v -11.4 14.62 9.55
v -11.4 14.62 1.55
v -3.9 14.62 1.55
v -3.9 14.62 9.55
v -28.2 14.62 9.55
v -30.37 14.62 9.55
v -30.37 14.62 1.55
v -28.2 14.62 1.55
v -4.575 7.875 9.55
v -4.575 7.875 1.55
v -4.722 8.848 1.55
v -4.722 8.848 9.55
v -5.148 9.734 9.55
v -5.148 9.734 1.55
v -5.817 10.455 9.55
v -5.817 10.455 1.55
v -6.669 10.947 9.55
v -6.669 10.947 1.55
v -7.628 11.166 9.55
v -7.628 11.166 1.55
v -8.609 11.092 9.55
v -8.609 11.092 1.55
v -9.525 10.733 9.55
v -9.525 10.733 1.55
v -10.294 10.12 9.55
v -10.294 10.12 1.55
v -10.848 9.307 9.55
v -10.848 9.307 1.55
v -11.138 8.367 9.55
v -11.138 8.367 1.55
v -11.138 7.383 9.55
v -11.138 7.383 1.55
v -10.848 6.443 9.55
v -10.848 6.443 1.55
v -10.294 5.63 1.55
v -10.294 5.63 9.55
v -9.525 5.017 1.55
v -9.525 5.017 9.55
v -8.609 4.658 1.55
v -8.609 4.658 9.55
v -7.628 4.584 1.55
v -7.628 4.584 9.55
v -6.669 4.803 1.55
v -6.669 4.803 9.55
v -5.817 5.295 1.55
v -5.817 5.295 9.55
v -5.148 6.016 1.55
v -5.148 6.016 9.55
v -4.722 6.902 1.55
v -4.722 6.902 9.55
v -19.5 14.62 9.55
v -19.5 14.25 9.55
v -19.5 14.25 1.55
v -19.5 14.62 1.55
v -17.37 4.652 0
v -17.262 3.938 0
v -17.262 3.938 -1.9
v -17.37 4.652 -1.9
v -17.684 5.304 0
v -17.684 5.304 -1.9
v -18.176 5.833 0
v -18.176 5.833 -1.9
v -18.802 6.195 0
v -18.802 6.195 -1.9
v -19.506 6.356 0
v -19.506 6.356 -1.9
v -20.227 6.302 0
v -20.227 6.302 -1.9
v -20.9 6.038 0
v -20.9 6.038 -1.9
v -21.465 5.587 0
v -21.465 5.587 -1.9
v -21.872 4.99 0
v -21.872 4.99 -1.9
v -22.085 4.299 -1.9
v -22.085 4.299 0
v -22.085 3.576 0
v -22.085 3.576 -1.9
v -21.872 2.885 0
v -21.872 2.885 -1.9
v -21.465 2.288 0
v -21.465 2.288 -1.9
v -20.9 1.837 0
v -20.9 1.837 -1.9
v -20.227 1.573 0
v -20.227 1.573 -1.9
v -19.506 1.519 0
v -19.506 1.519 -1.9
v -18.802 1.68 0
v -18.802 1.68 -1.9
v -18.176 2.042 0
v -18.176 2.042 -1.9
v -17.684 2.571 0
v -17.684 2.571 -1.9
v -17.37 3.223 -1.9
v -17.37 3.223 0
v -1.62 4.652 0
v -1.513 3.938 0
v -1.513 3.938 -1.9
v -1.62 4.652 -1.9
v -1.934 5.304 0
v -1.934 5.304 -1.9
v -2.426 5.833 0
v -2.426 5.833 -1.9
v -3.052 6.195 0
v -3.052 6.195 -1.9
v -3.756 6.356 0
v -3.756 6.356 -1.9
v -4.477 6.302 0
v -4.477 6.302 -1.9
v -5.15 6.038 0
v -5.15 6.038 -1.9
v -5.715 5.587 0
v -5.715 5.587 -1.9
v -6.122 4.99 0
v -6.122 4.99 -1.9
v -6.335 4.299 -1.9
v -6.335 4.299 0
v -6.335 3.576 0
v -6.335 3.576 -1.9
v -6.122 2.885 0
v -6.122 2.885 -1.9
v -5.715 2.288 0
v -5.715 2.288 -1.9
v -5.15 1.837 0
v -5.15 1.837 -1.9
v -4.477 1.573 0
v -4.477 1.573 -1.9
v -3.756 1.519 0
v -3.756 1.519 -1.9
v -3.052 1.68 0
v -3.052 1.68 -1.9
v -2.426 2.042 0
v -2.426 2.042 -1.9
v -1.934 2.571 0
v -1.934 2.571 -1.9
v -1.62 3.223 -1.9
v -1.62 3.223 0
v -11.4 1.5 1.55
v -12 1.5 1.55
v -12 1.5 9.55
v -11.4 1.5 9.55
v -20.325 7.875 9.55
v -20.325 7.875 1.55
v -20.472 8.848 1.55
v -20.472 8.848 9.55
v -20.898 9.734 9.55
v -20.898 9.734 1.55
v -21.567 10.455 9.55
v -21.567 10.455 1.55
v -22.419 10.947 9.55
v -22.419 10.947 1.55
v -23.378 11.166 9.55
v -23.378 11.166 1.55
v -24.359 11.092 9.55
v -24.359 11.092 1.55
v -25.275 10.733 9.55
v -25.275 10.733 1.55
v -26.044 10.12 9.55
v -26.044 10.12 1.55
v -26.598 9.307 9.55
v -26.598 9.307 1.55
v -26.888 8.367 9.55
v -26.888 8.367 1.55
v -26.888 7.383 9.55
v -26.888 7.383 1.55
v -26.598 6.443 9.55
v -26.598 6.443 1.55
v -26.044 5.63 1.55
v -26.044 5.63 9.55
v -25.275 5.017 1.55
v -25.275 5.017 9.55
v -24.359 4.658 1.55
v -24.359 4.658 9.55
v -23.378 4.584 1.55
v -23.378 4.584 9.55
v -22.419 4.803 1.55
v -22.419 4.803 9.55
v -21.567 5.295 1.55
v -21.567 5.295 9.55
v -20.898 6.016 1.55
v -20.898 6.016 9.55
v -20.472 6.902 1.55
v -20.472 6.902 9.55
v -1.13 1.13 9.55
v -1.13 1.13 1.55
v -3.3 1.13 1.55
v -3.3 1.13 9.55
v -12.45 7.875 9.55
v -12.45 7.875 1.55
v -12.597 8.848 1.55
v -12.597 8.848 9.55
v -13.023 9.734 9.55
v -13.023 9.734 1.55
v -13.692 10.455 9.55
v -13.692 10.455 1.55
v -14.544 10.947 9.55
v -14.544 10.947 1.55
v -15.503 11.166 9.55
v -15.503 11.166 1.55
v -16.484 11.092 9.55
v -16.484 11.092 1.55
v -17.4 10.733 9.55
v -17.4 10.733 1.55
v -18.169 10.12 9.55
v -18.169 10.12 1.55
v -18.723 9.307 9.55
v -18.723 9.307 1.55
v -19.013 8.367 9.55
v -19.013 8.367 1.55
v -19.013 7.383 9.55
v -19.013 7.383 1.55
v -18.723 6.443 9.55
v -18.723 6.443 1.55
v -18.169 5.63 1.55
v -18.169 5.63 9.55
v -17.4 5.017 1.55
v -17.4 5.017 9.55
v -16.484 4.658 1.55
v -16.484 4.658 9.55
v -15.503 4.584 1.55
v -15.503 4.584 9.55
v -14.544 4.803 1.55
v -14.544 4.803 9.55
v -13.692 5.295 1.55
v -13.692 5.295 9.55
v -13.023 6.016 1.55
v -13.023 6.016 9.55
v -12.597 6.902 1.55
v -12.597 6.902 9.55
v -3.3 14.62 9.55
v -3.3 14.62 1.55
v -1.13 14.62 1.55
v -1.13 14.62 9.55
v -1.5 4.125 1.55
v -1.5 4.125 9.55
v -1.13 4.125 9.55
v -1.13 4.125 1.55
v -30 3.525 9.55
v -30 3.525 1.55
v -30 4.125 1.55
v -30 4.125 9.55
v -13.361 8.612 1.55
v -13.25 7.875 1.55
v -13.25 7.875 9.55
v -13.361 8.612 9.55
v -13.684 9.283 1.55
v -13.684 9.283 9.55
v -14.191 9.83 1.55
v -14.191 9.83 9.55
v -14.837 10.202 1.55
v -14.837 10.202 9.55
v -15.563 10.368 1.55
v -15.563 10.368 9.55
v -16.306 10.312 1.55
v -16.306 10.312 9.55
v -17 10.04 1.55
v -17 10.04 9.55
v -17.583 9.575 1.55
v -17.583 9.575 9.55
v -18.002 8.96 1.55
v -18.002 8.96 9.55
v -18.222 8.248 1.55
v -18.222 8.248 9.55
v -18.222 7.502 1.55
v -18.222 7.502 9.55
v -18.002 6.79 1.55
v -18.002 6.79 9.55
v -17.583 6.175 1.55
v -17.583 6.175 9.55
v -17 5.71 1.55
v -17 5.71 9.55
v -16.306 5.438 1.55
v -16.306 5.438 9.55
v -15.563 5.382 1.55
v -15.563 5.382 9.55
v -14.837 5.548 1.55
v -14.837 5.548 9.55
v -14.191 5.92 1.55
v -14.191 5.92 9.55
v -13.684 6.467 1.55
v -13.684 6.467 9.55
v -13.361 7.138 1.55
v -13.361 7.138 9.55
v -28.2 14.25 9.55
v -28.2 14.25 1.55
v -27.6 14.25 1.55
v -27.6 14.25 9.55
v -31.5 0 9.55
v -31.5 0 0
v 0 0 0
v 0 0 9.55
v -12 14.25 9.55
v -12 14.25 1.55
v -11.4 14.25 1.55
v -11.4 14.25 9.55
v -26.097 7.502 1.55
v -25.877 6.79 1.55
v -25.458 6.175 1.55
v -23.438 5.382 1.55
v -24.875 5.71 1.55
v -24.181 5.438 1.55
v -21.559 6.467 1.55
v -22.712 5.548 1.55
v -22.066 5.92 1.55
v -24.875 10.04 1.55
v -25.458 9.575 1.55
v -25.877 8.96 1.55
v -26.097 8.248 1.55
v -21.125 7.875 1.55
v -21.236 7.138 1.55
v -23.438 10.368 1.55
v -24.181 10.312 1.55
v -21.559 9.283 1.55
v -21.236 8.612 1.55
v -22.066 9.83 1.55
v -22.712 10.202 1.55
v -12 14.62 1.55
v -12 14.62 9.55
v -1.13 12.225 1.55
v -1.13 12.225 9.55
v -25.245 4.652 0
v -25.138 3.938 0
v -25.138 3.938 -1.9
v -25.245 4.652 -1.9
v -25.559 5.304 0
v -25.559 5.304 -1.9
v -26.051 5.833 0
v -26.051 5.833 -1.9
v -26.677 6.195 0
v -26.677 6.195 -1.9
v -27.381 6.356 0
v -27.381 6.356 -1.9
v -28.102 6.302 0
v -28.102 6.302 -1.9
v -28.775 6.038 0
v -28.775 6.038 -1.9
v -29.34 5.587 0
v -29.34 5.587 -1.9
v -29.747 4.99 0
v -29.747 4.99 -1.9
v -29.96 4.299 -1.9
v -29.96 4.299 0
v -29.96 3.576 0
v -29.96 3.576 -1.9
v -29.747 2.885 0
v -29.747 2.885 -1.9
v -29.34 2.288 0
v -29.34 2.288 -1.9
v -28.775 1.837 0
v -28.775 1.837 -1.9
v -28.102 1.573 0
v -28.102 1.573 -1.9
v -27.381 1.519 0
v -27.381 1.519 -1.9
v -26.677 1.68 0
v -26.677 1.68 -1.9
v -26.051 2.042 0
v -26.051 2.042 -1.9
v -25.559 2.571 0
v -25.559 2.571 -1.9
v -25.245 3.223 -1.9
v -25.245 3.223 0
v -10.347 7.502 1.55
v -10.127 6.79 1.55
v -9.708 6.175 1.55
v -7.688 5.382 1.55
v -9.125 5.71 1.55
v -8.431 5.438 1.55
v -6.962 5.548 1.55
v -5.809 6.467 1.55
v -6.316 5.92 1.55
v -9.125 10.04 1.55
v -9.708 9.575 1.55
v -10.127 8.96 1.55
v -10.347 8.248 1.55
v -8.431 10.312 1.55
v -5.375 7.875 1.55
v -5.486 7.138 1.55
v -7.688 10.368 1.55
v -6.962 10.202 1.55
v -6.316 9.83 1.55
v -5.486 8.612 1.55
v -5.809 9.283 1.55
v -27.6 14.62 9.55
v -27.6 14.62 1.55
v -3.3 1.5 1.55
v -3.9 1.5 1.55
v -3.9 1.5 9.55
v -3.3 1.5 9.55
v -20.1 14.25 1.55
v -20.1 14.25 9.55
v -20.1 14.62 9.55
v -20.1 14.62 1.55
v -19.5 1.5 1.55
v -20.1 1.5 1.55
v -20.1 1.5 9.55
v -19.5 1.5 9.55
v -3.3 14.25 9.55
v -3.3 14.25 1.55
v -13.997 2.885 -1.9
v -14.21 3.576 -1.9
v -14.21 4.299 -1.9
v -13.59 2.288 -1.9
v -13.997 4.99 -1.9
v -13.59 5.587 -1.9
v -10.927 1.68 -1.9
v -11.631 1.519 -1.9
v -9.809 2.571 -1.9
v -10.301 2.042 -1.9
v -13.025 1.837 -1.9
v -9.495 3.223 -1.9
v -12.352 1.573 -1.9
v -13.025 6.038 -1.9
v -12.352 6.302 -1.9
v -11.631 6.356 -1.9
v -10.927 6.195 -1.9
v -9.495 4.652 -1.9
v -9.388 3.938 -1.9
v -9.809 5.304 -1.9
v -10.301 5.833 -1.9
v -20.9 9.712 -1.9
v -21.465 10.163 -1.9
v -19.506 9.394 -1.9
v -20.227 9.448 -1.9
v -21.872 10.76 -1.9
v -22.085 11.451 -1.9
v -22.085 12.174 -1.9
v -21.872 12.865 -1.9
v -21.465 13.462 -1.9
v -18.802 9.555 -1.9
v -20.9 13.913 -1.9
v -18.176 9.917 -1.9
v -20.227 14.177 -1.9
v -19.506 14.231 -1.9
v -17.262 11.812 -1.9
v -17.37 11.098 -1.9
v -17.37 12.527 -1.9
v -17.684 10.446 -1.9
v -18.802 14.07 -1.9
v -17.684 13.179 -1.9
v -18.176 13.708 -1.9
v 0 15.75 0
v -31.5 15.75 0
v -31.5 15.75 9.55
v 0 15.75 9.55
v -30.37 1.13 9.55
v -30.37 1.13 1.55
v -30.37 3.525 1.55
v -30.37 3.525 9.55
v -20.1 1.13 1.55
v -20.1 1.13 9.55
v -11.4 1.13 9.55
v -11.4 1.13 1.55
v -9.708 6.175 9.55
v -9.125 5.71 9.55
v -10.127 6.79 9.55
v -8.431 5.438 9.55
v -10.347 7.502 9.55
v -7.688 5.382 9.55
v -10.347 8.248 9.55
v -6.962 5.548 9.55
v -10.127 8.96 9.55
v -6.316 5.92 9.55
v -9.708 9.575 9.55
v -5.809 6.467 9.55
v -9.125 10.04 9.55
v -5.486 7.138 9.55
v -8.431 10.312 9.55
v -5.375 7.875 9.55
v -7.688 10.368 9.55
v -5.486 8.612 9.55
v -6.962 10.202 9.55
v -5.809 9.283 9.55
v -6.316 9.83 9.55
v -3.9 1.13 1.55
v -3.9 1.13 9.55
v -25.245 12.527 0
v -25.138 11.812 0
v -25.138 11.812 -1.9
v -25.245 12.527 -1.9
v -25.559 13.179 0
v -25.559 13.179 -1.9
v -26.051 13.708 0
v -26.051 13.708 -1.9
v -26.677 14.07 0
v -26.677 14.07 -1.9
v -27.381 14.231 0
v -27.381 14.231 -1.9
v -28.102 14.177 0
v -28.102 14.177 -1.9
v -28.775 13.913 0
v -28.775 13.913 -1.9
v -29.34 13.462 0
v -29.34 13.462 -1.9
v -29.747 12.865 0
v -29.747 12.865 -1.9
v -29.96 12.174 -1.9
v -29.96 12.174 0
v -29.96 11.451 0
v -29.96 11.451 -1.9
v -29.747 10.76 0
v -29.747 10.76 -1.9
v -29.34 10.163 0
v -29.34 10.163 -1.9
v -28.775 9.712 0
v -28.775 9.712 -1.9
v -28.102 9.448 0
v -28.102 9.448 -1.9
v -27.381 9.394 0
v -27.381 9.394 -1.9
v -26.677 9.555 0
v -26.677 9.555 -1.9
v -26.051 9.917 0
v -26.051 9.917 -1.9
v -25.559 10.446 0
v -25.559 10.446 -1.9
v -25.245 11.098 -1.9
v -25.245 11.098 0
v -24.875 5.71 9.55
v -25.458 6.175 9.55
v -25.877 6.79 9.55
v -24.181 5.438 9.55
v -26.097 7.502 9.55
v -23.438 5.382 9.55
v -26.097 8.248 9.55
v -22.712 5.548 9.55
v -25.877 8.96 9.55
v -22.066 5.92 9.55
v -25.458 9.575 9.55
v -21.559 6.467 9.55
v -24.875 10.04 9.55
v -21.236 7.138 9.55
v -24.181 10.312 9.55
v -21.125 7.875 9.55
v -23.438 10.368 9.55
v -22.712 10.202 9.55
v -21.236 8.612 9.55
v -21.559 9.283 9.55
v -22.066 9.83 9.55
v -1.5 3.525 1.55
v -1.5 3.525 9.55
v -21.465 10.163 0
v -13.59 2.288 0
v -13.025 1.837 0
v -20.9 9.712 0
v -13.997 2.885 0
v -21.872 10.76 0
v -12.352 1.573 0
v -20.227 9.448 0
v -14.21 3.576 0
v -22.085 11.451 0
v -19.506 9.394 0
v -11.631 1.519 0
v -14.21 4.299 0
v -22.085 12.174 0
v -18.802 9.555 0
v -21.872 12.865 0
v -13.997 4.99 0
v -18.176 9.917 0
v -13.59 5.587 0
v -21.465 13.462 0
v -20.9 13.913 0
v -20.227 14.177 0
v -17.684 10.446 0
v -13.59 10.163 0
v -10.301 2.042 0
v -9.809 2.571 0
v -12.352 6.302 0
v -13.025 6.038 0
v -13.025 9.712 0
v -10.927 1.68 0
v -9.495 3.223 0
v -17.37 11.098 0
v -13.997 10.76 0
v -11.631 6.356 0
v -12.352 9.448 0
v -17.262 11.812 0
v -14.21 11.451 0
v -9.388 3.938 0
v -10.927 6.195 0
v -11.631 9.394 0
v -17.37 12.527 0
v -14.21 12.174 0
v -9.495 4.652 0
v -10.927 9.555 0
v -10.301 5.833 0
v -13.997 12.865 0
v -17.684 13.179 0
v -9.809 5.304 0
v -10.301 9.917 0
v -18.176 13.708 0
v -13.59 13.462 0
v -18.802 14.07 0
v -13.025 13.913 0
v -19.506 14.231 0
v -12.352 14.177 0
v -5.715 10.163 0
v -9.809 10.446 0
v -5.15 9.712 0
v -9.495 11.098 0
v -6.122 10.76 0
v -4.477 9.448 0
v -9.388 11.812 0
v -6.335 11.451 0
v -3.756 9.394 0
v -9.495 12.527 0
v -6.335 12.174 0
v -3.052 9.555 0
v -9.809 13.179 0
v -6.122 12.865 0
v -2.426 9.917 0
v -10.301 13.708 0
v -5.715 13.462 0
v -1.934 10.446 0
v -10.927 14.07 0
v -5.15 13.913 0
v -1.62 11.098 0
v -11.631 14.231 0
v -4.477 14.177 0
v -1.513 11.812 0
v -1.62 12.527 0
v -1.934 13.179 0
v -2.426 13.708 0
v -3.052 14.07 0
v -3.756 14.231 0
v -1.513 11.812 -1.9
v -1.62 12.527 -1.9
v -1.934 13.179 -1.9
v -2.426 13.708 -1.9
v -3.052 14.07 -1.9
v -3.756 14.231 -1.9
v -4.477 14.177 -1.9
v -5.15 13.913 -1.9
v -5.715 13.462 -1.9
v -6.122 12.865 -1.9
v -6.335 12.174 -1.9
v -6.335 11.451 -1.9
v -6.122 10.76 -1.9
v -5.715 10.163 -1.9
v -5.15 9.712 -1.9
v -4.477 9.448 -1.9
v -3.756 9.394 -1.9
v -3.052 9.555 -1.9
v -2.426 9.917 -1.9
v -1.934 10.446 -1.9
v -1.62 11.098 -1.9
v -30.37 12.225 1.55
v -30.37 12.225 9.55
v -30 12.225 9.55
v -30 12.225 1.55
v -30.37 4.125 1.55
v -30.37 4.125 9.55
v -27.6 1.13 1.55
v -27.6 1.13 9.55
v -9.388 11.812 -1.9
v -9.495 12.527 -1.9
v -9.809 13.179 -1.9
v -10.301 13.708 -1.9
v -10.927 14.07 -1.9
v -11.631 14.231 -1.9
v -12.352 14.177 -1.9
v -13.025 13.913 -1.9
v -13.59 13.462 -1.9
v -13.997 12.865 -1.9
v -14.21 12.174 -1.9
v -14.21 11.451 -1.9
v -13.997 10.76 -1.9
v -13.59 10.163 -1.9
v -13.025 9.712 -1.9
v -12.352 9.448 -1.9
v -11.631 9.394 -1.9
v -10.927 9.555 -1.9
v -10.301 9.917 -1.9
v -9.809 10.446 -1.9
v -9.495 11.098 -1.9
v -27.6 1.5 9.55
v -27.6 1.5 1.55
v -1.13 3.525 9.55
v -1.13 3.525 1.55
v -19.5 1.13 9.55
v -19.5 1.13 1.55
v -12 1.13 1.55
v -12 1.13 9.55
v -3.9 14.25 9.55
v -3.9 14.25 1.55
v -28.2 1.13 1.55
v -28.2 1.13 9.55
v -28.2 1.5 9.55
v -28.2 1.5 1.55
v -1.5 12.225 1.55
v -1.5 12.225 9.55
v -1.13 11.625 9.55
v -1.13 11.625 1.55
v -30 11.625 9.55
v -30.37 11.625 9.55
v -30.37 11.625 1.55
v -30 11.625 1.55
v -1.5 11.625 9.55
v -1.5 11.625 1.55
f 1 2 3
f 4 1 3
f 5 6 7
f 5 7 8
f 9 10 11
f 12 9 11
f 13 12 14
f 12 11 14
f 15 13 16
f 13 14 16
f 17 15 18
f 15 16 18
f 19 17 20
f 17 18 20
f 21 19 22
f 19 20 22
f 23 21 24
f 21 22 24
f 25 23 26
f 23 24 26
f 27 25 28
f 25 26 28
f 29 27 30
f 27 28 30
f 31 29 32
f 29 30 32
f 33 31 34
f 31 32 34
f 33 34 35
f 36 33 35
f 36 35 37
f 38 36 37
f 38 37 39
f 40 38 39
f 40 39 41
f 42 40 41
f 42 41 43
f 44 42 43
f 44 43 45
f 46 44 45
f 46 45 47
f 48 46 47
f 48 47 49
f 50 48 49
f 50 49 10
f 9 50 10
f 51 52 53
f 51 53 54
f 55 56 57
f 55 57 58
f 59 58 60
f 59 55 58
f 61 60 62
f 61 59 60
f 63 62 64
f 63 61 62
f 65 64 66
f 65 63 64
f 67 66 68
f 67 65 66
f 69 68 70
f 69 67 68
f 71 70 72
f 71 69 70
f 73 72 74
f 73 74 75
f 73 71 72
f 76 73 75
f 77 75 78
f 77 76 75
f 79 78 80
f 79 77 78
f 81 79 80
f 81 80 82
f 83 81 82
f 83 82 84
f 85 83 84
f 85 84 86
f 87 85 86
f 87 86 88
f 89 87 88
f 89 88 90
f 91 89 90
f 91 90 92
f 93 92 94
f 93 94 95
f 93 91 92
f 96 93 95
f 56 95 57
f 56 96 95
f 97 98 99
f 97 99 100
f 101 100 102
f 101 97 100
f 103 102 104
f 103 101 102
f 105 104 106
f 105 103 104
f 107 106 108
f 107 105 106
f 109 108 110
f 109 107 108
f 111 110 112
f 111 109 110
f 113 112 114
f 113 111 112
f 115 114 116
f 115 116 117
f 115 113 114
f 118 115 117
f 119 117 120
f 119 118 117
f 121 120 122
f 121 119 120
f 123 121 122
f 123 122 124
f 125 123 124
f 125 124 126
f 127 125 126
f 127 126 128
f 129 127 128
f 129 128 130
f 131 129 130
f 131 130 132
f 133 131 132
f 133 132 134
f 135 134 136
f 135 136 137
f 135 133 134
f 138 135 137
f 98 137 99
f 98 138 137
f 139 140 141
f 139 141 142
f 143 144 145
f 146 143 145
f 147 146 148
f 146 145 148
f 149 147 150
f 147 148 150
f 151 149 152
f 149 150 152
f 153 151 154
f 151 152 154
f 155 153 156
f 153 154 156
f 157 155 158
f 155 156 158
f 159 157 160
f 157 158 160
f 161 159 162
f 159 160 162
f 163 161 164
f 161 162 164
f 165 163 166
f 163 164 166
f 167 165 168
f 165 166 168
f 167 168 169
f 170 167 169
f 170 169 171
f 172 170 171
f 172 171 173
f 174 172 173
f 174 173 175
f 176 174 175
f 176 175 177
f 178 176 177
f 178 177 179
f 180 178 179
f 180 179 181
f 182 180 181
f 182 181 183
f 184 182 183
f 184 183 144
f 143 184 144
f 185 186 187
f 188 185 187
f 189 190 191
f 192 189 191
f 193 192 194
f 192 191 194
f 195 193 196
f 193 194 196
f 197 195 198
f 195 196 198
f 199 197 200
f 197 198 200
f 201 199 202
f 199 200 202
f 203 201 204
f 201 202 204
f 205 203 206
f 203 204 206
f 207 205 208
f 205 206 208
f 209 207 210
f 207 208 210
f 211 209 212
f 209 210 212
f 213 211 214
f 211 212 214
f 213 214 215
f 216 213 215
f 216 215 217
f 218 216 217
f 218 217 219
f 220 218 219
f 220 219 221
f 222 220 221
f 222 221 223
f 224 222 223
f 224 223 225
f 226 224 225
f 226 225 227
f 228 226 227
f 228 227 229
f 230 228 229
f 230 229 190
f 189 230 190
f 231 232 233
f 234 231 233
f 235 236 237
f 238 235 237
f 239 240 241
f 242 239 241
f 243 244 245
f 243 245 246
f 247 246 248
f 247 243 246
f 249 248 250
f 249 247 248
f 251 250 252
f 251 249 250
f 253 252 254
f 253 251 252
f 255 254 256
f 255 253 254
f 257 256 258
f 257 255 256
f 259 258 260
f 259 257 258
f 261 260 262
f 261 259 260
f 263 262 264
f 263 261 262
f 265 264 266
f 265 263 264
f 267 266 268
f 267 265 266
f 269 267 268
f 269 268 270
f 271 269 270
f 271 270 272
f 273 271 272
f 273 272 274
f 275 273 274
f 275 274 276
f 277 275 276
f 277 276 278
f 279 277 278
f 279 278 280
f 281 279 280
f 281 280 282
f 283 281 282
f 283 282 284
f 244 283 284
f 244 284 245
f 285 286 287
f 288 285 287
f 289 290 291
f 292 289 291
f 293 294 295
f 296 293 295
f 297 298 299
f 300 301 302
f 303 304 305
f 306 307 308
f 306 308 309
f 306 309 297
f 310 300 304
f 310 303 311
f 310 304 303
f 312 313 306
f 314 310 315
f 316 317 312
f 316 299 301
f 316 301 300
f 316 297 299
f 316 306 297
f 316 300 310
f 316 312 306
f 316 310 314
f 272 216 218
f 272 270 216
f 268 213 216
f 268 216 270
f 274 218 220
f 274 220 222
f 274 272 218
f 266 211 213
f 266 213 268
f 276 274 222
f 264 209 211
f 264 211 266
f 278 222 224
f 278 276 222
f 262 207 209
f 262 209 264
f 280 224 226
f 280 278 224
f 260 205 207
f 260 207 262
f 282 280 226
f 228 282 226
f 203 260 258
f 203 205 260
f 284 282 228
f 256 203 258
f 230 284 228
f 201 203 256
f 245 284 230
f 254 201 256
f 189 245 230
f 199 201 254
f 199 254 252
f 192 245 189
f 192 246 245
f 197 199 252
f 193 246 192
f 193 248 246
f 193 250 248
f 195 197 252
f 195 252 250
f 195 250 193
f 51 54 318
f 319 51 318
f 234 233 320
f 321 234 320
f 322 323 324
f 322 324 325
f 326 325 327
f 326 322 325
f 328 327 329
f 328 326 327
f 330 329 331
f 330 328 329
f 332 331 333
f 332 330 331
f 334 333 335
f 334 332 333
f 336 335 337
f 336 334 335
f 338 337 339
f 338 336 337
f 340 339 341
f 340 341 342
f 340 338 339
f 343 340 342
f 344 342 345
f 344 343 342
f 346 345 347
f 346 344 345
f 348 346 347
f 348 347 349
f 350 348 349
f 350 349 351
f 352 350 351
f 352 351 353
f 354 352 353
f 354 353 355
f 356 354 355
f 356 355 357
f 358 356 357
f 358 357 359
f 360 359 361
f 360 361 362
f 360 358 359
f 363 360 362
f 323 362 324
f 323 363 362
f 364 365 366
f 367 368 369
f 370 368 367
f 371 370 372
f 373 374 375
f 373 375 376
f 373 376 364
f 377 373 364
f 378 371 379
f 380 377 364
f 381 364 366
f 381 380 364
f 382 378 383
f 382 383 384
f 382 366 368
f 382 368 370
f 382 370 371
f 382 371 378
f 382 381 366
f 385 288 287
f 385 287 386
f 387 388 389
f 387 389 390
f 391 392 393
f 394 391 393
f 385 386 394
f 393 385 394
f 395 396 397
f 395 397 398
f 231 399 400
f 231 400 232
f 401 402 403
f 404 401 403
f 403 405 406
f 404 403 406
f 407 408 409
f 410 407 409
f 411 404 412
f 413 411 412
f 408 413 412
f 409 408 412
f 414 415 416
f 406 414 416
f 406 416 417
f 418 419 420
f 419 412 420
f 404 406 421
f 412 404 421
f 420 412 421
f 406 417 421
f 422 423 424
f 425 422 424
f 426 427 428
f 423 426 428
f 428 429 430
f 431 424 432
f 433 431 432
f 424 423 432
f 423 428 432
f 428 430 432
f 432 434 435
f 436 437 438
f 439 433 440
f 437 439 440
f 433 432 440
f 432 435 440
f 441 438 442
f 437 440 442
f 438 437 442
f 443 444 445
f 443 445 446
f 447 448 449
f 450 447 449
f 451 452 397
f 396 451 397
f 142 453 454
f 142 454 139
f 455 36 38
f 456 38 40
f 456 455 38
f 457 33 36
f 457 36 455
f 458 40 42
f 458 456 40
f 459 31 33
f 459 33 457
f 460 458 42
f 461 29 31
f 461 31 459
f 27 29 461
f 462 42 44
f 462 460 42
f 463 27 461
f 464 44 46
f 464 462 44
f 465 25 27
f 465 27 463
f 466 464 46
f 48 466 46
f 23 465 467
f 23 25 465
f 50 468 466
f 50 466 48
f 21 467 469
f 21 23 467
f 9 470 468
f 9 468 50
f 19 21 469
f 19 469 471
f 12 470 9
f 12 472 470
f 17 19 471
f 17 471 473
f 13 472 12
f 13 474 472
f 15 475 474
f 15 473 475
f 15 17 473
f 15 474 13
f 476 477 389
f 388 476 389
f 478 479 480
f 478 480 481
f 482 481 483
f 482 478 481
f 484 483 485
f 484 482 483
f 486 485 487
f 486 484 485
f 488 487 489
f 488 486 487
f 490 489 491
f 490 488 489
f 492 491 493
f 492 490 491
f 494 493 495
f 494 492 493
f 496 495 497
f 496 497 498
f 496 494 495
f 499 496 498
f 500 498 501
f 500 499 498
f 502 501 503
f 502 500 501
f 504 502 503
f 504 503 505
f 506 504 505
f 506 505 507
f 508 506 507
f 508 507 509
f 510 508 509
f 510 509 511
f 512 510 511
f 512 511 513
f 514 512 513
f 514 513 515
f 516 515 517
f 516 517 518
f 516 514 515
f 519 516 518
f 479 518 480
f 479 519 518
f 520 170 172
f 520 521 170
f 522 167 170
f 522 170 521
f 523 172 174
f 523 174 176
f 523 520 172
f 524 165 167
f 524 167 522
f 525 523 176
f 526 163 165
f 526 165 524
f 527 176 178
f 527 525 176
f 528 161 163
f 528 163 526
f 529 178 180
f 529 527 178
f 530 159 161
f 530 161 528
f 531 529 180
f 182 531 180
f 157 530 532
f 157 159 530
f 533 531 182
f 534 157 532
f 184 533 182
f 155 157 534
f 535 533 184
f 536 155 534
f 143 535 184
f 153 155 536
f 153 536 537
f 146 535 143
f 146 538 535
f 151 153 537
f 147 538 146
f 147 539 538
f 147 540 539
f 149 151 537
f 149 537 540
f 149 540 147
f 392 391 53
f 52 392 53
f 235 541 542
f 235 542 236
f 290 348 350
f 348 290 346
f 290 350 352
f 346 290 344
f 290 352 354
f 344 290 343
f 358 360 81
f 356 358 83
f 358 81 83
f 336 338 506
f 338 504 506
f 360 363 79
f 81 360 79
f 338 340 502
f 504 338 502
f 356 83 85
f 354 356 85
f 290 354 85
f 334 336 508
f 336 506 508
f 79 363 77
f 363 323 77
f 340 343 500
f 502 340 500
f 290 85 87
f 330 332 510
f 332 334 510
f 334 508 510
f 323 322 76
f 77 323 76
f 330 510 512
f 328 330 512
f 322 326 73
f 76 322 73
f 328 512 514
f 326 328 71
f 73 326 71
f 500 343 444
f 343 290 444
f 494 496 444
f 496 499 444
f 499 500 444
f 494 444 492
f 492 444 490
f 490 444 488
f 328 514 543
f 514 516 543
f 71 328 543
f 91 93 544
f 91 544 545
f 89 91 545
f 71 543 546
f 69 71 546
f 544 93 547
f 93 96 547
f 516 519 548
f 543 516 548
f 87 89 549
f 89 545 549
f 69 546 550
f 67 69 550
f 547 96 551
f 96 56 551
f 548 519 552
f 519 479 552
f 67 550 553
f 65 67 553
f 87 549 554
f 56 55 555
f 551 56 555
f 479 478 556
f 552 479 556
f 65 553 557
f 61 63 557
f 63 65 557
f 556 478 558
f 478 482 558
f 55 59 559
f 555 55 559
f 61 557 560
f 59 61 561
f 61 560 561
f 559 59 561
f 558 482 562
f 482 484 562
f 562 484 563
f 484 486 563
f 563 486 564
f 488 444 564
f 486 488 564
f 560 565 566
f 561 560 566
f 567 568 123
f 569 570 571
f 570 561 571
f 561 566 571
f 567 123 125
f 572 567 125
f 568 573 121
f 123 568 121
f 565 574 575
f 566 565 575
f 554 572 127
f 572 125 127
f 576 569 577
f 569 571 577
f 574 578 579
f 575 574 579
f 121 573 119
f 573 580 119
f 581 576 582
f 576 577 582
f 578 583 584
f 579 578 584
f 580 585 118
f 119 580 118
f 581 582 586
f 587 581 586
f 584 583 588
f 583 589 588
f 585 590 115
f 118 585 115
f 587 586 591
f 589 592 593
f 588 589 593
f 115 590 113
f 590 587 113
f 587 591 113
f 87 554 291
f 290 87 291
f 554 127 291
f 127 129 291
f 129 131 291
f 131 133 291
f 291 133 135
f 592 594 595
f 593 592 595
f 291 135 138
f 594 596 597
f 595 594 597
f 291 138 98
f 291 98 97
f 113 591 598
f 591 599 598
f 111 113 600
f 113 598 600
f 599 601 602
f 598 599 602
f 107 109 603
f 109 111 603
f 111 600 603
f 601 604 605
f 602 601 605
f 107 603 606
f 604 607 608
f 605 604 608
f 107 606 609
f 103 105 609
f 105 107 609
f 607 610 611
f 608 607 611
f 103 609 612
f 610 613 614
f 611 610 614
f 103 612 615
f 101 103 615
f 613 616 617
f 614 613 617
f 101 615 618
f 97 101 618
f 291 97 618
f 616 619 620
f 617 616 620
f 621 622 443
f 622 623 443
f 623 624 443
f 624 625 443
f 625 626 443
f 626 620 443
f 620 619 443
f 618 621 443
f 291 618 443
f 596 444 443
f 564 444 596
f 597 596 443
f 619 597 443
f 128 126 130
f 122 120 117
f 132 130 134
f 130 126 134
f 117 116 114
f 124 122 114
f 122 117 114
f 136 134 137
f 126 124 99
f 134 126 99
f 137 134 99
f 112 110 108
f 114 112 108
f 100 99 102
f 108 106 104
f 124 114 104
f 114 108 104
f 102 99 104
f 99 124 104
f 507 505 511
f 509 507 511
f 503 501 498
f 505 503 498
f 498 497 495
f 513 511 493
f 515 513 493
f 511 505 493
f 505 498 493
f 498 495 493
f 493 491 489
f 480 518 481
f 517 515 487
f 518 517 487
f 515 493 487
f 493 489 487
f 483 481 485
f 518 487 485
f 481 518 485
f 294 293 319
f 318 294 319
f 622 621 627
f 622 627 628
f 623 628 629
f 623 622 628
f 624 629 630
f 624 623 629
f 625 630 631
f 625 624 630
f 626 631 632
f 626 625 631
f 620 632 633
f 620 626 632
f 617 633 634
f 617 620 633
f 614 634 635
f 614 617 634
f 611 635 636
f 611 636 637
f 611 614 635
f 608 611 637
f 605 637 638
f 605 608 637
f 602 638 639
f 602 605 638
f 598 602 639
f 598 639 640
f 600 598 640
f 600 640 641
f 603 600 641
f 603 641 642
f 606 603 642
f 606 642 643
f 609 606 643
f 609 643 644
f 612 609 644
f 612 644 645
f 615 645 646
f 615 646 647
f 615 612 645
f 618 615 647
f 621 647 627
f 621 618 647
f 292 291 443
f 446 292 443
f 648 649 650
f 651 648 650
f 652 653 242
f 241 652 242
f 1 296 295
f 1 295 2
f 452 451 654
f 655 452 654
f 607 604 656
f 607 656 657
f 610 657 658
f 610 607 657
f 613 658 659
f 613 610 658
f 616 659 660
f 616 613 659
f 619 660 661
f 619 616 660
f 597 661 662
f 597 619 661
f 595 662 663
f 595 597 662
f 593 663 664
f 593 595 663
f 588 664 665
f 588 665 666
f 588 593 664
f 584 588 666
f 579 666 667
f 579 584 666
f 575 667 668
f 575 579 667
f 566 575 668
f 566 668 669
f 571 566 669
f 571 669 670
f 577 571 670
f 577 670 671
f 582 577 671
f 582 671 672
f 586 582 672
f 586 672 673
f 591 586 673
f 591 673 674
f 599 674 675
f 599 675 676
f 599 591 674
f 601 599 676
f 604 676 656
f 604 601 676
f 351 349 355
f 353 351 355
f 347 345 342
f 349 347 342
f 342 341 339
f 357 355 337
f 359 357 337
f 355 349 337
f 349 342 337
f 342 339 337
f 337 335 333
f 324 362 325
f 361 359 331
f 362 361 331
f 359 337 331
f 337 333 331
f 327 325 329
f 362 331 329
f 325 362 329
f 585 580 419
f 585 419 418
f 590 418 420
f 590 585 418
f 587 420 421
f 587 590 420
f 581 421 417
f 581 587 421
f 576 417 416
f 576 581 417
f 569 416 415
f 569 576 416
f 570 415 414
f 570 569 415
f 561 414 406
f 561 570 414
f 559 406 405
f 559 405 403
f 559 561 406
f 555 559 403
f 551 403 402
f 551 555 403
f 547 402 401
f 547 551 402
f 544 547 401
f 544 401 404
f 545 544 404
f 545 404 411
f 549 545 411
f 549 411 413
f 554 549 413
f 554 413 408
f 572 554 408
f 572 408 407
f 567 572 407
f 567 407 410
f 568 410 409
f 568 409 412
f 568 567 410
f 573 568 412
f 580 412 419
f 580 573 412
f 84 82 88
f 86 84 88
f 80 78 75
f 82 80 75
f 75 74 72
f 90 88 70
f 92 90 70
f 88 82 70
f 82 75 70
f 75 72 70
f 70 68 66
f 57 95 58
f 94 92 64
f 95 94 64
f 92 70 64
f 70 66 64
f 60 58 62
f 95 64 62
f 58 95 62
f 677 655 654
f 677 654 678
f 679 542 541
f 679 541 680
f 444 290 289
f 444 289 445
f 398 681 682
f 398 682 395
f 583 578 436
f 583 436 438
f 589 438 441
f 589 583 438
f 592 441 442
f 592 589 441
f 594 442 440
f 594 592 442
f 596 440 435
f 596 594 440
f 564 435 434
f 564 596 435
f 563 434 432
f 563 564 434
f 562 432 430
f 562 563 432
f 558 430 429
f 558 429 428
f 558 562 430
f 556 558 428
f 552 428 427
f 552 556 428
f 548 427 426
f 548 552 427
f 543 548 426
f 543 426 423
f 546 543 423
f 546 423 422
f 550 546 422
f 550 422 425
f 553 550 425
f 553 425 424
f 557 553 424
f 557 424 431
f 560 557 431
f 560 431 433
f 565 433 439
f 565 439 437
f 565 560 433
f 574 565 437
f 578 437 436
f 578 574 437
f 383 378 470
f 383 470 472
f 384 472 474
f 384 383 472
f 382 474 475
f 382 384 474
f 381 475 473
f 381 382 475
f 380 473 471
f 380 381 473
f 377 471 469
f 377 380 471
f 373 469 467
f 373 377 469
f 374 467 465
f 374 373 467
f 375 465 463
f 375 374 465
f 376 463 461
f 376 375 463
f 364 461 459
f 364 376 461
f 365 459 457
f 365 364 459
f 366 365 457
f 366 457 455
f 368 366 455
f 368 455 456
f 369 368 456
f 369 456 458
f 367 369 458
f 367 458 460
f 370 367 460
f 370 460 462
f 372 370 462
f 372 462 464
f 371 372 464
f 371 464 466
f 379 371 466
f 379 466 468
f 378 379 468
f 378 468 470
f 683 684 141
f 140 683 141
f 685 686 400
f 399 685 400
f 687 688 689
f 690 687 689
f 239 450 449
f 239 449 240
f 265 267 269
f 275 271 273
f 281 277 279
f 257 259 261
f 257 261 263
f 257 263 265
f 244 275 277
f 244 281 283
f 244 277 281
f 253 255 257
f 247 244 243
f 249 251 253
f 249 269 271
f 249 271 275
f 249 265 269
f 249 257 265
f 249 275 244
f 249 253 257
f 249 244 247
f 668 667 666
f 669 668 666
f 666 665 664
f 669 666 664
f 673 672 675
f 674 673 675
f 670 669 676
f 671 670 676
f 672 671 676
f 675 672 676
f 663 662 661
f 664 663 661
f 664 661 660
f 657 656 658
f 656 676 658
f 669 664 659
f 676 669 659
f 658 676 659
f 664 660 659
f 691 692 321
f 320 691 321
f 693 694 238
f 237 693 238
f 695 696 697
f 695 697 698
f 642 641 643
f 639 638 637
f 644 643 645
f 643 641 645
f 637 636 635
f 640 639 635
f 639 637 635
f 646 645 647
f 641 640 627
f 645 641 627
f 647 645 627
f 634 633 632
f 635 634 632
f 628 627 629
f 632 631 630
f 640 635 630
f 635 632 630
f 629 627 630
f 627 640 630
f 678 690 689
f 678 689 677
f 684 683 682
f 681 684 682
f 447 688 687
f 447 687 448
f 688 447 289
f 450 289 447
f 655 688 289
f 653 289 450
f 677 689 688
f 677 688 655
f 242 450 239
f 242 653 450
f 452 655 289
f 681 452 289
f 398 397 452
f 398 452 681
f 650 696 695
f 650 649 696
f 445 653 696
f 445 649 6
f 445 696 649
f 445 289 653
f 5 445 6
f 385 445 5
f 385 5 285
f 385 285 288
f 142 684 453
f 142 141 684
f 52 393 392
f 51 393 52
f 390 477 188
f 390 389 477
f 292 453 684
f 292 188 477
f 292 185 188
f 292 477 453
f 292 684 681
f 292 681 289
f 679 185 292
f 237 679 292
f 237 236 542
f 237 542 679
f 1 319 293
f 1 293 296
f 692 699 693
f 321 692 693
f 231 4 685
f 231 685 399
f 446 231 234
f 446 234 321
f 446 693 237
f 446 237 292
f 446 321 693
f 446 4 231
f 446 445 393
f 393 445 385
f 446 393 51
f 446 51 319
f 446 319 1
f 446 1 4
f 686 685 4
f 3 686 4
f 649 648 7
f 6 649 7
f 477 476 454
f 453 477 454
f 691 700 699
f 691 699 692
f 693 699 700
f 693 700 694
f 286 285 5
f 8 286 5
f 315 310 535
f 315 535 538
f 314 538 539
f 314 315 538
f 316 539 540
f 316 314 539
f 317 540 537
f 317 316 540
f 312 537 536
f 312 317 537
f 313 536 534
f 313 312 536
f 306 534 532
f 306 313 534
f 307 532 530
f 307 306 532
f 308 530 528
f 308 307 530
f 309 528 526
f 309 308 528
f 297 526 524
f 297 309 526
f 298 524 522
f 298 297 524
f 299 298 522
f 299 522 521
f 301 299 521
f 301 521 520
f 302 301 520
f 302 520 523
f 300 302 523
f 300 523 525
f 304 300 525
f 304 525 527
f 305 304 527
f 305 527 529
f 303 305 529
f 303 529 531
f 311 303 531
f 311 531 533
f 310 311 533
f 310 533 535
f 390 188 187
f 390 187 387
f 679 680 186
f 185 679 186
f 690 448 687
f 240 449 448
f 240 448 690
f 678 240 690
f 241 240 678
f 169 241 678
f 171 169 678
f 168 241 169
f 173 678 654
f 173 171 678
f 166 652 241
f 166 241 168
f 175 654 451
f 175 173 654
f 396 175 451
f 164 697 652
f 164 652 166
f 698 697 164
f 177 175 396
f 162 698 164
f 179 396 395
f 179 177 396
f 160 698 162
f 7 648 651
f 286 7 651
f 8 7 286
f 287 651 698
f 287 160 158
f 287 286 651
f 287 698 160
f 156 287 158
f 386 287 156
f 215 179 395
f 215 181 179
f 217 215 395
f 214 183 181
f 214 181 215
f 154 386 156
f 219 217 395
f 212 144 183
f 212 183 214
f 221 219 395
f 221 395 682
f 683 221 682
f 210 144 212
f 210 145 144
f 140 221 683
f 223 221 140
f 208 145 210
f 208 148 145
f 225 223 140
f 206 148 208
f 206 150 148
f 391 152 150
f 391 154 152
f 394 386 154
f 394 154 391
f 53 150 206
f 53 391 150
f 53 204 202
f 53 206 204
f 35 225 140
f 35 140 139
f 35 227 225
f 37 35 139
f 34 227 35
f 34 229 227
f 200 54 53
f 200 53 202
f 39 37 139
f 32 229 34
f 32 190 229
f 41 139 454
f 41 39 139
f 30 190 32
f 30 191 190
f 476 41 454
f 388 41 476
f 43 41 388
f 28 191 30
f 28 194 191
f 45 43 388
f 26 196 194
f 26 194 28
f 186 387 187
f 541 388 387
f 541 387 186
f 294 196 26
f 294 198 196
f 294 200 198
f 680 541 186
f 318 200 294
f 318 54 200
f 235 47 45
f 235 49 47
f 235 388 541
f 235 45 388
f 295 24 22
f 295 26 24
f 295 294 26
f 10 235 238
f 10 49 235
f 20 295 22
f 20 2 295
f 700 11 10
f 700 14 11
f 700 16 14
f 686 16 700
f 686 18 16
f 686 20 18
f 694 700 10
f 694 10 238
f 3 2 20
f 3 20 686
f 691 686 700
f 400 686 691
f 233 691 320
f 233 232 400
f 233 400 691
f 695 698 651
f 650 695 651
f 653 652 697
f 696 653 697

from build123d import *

# Parameters (mm, degrees)
F0_W     = 31.5
F0_H     = 15.75
F0_W_2   = 0.37
F0_H_2   = 0.6
F0_W_3   = 0.6
F0_H_3   = 0.37
F1_DEPTH = 9.55
F0_R     = 3.3
F0_R_2   = 2.5
F2_DEPTH = 1.55
F3_R     = 2.425
F4_DEPTH = 1.9


# Not quite as in the source:
# - a feature names something its author has since deleted; it is built from what else it names


with BuildPart() as f1:
    # F0 (on Top) → F1 (new body)
    with BuildSketch(Plane.XY):
        with Locations((-15.75, 7.875)):
            Rectangle(F0_W, F0_H)
        Polygon((-30.37, 12.225), (-30.37, 14.62), (-28.2, 14.62), (-27.6, 14.62), (-20.1, 14.62), (-19.5, 14.62), (-12, 14.62), (-11.4, 14.62), (-3.9, 14.62), (-3.3, 14.62), (-1.13, 14.62), (-1.13, 12.225), (-1.13, 11.625), (-1.13, 4.125), (-1.13, 3.525), (-1.13, 1.13), (-3.3, 1.13), (-3.9, 1.13), (-11.4, 1.13), (-12, 1.13), (-19.5, 1.13), (-20.1, 1.13), (-27.6, 1.13), (-28.2, 1.13), (-30.37, 1.13), (-30.37, 3.525), (-30.37, 4.125), (-30.37, 11.625), align=None, mode=Mode.SUBTRACT)
        with Locations((-30.185, 11.925)):
            Rectangle(F0_W_2, F0_H_2)
        with Locations((-27.9, 14.435)):
            Rectangle(F0_W_3, F0_H_3)
        with Locations((-19.8, 14.435)):
            Rectangle(F0_W_3, F0_H_3)
        with Locations((-11.7, 14.435)):
            Rectangle(F0_W_3, F0_H_3)
        with Locations((-3.6, 14.435)):
            Rectangle(F0_W_3, F0_H_3)
        with Locations((-1.315, 11.925)):
            Rectangle(F0_W_2, F0_H_2)
        with Locations((-1.315, 3.825)):
            Rectangle(F0_W_2, F0_H_2)
        with Locations((-3.6, 1.315)):
            Rectangle(F0_W_3, F0_H_3)
        with Locations((-11.7, 1.315)):
            Rectangle(F0_W_3, F0_H_3)
        with Locations((-19.8, 1.315)):
            Rectangle(F0_W_3, F0_H_3)
        with Locations((-27.9, 1.315)):
            Rectangle(F0_W_3, F0_H_3)
        with Locations((-30.185, 3.825)):
            Rectangle(F0_W_2, F0_H_2)
    extrude(amount=F1_DEPTH)



with BuildPart() as f1b:
    # F0 (on Top) → F1, piece 2 (new body)
    with BuildSketch(Plane.XY):
        with Locations((-23.625, 7.875)):
            Circle(F0_R)
        with Locations((-23.625, 7.875)):
            Circle(F0_R_2, mode=Mode.SUBTRACT)
    extrude(amount=F1_DEPTH)


with BuildPart() as f1c:
    # F0 (on Top) → F1, piece 3 (new body)
    with BuildSketch(Plane.XY):
        with Locations((-7.875, 7.875)):
            Circle(F0_R)
        with Locations((-7.875, 7.875)):
            Circle(F0_R_2, mode=Mode.SUBTRACT)
    extrude(amount=F1_DEPTH)


with BuildPart() as f1d:
    # F0 (on Top) → F1, piece 4 (new body)
    with BuildSketch(Plane.XY):
        with Locations((-15.75, 7.875)):
            Circle(F0_R)
        with Locations((-15.75, 7.875)):
            Circle(F0_R_2, mode=Mode.SUBTRACT)
    extrude(amount=F1_DEPTH)


with BuildPart() as f1_1:
    add(f1.part)

    add(f1b.part)  # F2 merges F1b

    add(f1c.part)  # F2 merges F1c

    add(f1d.part)  # F2 merges F1d
    # F0 (on Top) → F2 (join)
    with BuildSketch(Plane.XY):
        Polygon((-28.2, 14.62), (-30.37, 14.62), (-30.37, 12.225), (-30, 12.225), (-30, 11.625), (-30.37, 11.625), (-30.37, 4.125), (-30, 4.125), (-30, 3.525), (-30.37, 3.525), (-30.37, 1.13), (-28.2, 1.13), (-28.2, 1.5), (-27.6, 1.5), (-27.6, 1.13), (-20.1, 1.13), (-20.1, 1.5), (-19.5, 1.5), (-19.5, 1.13), (-12, 1.13), (-12, 1.5), (-11.4, 1.5), (-11.4, 1.13), (-3.9, 1.13), (-3.9, 1.5), (-3.3, 1.5), (-3.3, 1.13), (-1.13, 1.13), (-1.13, 3.525), (-1.5, 3.525), (-1.5, 4.125), (-1.13, 4.125), (-1.13, 11.625), (-1.5, 11.625), (-1.5, 12.225), (-1.13, 12.225), (-1.13, 14.62), (-3.3, 14.62), (-3.3, 14.25), (-3.9, 14.25), (-3.9, 14.62), (-11.4, 14.62), (-11.4, 14.25), (-12, 14.25), (-12, 14.62), (-19.5, 14.62), (-19.5, 14.25), (-20.1, 14.25), (-20.1, 14.62), (-27.6, 14.62), (-27.6, 14.25), (-28.2, 14.25), align=None)
        with Locations((-23.625, 7.875)):
            Circle(F0_R, mode=Mode.SUBTRACT)
        with Locations((-15.75, 7.875)):
            Circle(F0_R, mode=Mode.SUBTRACT)
        with Locations((-7.875, 7.875)):
            Circle(F0_R, mode=Mode.SUBTRACT)
        with Locations((-23.625, 7.875)):
            Circle(F0_R_2)
        with Locations((-7.875, 7.875)):
            Circle(F0_R_2)
        with Locations((-15.75, 7.875)):
            Circle(F0_R_2)
    extrude(amount=F2_DEPTH)

    # F3 (on face) → F4 (join)
    with BuildSketch(Plane.XY):
        with Locations((-27.5625, 3.9375)):
            Circle(F3_R)
        with Locations((-11.8125, 3.9375)):
            Circle(F3_R)
        with Locations((-3.9375, 3.9375)):
            Circle(F3_R)
        with Locations((-3.9375, 11.8125)):
            Circle(F3_R)
        with Locations((-11.8125, 11.8125)):
            Circle(F3_R)
        with Locations((-19.6875, 11.8125)):
            Circle(F3_R)
        with Locations((-27.5625, 11.8125)):
            Circle(F3_R)
        with Locations((-19.6875, 3.9375)):
            Circle(F3_R)
    extrude(amount=-F4_DEPTH)


solid = f1_1.part
